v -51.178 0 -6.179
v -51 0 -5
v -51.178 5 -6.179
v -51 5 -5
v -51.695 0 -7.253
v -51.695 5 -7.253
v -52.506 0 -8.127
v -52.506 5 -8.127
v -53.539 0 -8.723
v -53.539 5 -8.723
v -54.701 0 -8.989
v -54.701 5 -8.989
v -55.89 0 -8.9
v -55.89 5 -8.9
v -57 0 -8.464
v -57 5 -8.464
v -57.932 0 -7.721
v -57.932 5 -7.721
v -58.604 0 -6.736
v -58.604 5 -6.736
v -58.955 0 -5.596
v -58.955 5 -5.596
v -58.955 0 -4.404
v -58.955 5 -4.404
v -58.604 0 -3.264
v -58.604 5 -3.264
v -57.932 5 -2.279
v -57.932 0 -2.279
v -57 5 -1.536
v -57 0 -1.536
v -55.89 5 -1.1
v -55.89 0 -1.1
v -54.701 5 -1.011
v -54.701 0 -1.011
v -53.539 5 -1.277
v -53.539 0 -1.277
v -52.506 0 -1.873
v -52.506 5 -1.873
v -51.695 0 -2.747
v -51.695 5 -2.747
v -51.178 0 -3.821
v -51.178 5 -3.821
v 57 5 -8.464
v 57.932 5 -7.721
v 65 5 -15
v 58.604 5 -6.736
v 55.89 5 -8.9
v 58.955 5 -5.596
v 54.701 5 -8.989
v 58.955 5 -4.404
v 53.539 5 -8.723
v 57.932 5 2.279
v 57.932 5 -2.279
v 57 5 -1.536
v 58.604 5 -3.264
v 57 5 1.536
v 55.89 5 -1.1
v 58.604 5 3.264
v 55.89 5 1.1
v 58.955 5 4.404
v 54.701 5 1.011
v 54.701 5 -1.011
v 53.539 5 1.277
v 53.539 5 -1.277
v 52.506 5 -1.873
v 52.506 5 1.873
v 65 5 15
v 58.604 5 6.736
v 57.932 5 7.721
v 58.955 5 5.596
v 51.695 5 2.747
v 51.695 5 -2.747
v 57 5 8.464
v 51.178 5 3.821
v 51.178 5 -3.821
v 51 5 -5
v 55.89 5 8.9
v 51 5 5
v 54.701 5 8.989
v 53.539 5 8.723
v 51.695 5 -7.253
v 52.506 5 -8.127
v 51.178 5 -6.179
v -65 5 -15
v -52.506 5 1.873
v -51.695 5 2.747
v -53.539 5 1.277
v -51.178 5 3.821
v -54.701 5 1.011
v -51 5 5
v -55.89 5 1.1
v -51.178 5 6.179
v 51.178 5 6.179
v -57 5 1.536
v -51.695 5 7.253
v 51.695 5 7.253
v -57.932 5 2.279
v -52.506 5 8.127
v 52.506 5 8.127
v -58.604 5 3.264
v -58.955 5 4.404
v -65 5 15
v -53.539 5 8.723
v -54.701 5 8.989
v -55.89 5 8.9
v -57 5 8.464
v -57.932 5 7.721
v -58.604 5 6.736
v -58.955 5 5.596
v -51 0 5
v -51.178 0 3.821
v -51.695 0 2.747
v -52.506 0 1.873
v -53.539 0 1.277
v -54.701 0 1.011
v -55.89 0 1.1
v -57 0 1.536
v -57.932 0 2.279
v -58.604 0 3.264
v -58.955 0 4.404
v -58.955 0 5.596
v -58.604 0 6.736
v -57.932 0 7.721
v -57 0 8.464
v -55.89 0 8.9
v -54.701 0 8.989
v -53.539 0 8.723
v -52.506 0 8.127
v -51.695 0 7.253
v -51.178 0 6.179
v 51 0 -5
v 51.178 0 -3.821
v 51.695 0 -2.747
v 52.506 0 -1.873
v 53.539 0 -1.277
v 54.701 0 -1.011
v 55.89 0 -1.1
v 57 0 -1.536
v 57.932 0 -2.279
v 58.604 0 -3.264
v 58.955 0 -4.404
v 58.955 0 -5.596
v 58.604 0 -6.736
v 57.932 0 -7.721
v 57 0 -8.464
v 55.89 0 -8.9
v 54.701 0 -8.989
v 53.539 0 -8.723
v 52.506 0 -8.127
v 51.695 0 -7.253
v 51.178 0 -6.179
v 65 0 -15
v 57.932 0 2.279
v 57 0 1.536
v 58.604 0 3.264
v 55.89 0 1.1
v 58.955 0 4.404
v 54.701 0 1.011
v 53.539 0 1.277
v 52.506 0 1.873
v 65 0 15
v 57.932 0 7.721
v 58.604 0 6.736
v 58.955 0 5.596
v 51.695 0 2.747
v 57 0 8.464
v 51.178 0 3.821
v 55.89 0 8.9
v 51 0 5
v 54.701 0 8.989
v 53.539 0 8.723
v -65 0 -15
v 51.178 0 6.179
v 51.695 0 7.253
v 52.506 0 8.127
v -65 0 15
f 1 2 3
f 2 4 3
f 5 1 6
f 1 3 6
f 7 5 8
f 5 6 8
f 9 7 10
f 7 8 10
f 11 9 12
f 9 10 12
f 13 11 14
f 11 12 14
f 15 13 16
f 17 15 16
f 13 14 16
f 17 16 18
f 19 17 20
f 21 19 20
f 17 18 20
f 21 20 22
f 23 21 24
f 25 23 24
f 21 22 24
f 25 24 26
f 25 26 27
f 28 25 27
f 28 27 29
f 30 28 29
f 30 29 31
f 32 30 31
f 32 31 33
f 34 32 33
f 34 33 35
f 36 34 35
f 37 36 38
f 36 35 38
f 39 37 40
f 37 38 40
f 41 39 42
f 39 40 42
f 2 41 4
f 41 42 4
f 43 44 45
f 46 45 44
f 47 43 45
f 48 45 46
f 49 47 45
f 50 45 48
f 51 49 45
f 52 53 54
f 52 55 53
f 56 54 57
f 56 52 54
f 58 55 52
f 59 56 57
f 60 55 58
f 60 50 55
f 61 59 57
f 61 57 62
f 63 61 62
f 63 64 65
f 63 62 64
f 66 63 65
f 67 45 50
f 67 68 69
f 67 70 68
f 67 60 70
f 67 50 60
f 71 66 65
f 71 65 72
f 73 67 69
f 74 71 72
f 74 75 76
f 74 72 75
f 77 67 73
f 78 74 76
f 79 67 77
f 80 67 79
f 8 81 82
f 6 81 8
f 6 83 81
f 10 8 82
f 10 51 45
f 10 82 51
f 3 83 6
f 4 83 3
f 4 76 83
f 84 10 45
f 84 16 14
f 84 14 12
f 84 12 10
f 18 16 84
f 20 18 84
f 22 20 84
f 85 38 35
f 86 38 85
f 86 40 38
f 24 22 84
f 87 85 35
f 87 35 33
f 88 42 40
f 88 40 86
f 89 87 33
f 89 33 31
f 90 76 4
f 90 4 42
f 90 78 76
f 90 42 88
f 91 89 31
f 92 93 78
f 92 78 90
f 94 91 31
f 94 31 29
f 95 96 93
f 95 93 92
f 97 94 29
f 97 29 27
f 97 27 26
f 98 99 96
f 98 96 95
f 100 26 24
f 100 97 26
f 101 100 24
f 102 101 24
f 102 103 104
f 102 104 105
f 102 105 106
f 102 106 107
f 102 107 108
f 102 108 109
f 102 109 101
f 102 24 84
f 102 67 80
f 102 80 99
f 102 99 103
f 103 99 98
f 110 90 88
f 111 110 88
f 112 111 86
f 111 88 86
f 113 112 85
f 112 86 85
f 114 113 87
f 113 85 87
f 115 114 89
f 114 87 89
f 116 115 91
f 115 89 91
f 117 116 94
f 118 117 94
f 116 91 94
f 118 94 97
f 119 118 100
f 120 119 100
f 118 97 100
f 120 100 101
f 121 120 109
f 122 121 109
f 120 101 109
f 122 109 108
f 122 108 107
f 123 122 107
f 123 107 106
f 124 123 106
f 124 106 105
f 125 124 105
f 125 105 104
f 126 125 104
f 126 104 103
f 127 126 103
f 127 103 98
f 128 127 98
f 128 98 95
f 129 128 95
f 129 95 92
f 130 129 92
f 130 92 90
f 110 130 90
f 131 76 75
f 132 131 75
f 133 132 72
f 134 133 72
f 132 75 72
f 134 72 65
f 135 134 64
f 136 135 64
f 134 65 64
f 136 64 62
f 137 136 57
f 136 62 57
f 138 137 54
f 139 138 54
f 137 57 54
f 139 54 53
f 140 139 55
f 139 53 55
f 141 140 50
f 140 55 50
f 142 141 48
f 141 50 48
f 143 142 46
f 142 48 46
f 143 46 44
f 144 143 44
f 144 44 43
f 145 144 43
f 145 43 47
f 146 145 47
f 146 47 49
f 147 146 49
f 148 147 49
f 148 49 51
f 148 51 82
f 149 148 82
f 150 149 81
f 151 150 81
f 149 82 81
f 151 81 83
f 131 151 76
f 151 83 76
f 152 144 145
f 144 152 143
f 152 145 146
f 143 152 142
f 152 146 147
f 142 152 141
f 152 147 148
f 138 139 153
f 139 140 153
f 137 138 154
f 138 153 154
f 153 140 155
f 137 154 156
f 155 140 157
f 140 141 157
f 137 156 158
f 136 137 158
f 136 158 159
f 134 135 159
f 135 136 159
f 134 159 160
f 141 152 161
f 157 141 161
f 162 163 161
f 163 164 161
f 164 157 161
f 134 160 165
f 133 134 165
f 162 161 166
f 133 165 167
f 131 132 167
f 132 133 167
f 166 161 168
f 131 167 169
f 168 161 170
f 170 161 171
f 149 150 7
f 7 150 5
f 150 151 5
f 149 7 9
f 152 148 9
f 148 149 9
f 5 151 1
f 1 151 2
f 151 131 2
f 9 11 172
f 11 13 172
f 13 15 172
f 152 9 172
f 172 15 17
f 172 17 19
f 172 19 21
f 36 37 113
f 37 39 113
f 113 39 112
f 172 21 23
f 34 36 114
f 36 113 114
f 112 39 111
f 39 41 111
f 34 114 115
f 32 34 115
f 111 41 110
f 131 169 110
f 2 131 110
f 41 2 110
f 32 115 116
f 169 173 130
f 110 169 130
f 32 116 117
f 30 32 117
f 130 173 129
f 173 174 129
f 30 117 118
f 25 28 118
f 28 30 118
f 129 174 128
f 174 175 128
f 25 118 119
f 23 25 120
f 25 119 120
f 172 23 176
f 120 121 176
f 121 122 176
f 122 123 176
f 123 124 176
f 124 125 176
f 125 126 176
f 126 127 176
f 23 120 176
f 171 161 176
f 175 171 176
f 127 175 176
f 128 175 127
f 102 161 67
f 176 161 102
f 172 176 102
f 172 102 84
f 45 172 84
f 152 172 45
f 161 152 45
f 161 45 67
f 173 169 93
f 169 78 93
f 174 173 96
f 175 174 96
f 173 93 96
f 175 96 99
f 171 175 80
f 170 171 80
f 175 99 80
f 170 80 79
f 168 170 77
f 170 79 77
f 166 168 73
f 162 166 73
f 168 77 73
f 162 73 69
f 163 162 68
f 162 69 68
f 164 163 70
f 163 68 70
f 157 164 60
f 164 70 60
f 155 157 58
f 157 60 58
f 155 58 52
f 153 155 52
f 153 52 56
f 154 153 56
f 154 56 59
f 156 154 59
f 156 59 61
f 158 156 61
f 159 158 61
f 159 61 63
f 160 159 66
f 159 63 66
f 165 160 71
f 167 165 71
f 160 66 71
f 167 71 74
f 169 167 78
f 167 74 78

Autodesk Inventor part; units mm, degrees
ref_plane "YZ Plane" through (0, 0, 0) normal (1, 0, 0) x (0, 1, 0)
ref_plane "XZ Plane" through (0, 0, 0) normal (0, 1, 0) x (-1, 0, 0)
sketch "Sketch1" plane through (0, 0, 0) normal (0, 1, 0) x (-1, 0, 0)
  line L0 (-65, 15) -> (65, 15)
  line L1 (65, 15) -> (65, -15)
  line L2 (65, -15) -> (-65, -15)
  line L3 (-65, -15) -> (-65, 15)
  line L4 (-65, 15) -> (65, -15) construction
  line L5 (65, 15) -> (-65, -15) construction
  point P0 (0, 0)
  dimension "d0" = 130
  dimension "d1" = 30
extrude "Plate1" add sketch "Sketch1" along normal blind 5
sketch "Sketch3" plane through (0, 5, 0) normal (0, 1, 0) x (1, 0, 0)
  line L0 (-65, -15) -> (-65, 15) projected
  line L1 (-65, 0) -> (-55, 0)
  line L2 (-40.6549, -15) -> (-40.6549, 15) projected
  line L3 (-57.1441, -5) -> (-52.8559, -5)
  line L4 (-52.8559, -5) -> (-52.8559, 5)
  line L5 (-52.8559, 5) -> (-57.1441, 5)
  line L6 (-57.1441, 5) -> (-57.1441, -5)
  line L7 (-57.1441, -5) -> (-52.8559, 5) construction
  line L8 (-52.8559, -5) -> (-57.1441, 5) construction
  circle A0 centre (-55, 5) radius 4
  circle A1 centre (-55, -5) radius 4
  point P0 (0, 0)
  dimension "d10" = 10
  dimension "d11" = 10
  dimension "d12" = 8
  dimension "d13" = 8
extrude "Cut1" cut sketch "Sketch3" against normal blind 5 contours L6 A1 L4 L3 | L3 L4 A1 L6 | A0 L6 L5 L4 | L4 L5 L6 A0
ref_plane "Work Plane1" through (0, 39.345, 0) normal (0, 1, 0) x (1, 0, 0)
mirror "Mirror1" about plane through (0, 39.345, 0) normal (0, 1, 0) of "Cut1"
sketch "Sketch8" plane through (65, 5, 15) normal (0, 1, 0) x (-1, 0, 0)
  circle A0 centre (10, -10) radius 4 projected
  circle A1 centre (10, -10) radius 4
  circle A2 centre (10, -20) radius 4 projected
  circle A3 centre (10, -20) radius 4
  point P0 (65, -15)
extrude "Cut4" cut sketch "Sketch8" against normal blind 5
sketch "Sketch9" plane through (65, 0, -15) normal (0, -1, 0) x (-1, 0, 0)
  point P0 (65, -15)
equation "\"d14\" = Thickness"
equation "\"d36\" = Thickness"
equation "\"d2\" = Thickness"
equation "\"BendRadius\" = Thickness"
equation "\"BendReliefWidth\" = Thickness"
equation "\"BendReliefDepth\" = 0.5 * Thickness"
equation "\"TransitionRadius\" = BendRadius"
equation "\"JacobiRadiusSize\" = BendRadius"
equation "\"GapSize\" = Thickness"
equation "\"Thickness\" = 5"
properties part number "up bracket1111" material "Steel, Alloy"
